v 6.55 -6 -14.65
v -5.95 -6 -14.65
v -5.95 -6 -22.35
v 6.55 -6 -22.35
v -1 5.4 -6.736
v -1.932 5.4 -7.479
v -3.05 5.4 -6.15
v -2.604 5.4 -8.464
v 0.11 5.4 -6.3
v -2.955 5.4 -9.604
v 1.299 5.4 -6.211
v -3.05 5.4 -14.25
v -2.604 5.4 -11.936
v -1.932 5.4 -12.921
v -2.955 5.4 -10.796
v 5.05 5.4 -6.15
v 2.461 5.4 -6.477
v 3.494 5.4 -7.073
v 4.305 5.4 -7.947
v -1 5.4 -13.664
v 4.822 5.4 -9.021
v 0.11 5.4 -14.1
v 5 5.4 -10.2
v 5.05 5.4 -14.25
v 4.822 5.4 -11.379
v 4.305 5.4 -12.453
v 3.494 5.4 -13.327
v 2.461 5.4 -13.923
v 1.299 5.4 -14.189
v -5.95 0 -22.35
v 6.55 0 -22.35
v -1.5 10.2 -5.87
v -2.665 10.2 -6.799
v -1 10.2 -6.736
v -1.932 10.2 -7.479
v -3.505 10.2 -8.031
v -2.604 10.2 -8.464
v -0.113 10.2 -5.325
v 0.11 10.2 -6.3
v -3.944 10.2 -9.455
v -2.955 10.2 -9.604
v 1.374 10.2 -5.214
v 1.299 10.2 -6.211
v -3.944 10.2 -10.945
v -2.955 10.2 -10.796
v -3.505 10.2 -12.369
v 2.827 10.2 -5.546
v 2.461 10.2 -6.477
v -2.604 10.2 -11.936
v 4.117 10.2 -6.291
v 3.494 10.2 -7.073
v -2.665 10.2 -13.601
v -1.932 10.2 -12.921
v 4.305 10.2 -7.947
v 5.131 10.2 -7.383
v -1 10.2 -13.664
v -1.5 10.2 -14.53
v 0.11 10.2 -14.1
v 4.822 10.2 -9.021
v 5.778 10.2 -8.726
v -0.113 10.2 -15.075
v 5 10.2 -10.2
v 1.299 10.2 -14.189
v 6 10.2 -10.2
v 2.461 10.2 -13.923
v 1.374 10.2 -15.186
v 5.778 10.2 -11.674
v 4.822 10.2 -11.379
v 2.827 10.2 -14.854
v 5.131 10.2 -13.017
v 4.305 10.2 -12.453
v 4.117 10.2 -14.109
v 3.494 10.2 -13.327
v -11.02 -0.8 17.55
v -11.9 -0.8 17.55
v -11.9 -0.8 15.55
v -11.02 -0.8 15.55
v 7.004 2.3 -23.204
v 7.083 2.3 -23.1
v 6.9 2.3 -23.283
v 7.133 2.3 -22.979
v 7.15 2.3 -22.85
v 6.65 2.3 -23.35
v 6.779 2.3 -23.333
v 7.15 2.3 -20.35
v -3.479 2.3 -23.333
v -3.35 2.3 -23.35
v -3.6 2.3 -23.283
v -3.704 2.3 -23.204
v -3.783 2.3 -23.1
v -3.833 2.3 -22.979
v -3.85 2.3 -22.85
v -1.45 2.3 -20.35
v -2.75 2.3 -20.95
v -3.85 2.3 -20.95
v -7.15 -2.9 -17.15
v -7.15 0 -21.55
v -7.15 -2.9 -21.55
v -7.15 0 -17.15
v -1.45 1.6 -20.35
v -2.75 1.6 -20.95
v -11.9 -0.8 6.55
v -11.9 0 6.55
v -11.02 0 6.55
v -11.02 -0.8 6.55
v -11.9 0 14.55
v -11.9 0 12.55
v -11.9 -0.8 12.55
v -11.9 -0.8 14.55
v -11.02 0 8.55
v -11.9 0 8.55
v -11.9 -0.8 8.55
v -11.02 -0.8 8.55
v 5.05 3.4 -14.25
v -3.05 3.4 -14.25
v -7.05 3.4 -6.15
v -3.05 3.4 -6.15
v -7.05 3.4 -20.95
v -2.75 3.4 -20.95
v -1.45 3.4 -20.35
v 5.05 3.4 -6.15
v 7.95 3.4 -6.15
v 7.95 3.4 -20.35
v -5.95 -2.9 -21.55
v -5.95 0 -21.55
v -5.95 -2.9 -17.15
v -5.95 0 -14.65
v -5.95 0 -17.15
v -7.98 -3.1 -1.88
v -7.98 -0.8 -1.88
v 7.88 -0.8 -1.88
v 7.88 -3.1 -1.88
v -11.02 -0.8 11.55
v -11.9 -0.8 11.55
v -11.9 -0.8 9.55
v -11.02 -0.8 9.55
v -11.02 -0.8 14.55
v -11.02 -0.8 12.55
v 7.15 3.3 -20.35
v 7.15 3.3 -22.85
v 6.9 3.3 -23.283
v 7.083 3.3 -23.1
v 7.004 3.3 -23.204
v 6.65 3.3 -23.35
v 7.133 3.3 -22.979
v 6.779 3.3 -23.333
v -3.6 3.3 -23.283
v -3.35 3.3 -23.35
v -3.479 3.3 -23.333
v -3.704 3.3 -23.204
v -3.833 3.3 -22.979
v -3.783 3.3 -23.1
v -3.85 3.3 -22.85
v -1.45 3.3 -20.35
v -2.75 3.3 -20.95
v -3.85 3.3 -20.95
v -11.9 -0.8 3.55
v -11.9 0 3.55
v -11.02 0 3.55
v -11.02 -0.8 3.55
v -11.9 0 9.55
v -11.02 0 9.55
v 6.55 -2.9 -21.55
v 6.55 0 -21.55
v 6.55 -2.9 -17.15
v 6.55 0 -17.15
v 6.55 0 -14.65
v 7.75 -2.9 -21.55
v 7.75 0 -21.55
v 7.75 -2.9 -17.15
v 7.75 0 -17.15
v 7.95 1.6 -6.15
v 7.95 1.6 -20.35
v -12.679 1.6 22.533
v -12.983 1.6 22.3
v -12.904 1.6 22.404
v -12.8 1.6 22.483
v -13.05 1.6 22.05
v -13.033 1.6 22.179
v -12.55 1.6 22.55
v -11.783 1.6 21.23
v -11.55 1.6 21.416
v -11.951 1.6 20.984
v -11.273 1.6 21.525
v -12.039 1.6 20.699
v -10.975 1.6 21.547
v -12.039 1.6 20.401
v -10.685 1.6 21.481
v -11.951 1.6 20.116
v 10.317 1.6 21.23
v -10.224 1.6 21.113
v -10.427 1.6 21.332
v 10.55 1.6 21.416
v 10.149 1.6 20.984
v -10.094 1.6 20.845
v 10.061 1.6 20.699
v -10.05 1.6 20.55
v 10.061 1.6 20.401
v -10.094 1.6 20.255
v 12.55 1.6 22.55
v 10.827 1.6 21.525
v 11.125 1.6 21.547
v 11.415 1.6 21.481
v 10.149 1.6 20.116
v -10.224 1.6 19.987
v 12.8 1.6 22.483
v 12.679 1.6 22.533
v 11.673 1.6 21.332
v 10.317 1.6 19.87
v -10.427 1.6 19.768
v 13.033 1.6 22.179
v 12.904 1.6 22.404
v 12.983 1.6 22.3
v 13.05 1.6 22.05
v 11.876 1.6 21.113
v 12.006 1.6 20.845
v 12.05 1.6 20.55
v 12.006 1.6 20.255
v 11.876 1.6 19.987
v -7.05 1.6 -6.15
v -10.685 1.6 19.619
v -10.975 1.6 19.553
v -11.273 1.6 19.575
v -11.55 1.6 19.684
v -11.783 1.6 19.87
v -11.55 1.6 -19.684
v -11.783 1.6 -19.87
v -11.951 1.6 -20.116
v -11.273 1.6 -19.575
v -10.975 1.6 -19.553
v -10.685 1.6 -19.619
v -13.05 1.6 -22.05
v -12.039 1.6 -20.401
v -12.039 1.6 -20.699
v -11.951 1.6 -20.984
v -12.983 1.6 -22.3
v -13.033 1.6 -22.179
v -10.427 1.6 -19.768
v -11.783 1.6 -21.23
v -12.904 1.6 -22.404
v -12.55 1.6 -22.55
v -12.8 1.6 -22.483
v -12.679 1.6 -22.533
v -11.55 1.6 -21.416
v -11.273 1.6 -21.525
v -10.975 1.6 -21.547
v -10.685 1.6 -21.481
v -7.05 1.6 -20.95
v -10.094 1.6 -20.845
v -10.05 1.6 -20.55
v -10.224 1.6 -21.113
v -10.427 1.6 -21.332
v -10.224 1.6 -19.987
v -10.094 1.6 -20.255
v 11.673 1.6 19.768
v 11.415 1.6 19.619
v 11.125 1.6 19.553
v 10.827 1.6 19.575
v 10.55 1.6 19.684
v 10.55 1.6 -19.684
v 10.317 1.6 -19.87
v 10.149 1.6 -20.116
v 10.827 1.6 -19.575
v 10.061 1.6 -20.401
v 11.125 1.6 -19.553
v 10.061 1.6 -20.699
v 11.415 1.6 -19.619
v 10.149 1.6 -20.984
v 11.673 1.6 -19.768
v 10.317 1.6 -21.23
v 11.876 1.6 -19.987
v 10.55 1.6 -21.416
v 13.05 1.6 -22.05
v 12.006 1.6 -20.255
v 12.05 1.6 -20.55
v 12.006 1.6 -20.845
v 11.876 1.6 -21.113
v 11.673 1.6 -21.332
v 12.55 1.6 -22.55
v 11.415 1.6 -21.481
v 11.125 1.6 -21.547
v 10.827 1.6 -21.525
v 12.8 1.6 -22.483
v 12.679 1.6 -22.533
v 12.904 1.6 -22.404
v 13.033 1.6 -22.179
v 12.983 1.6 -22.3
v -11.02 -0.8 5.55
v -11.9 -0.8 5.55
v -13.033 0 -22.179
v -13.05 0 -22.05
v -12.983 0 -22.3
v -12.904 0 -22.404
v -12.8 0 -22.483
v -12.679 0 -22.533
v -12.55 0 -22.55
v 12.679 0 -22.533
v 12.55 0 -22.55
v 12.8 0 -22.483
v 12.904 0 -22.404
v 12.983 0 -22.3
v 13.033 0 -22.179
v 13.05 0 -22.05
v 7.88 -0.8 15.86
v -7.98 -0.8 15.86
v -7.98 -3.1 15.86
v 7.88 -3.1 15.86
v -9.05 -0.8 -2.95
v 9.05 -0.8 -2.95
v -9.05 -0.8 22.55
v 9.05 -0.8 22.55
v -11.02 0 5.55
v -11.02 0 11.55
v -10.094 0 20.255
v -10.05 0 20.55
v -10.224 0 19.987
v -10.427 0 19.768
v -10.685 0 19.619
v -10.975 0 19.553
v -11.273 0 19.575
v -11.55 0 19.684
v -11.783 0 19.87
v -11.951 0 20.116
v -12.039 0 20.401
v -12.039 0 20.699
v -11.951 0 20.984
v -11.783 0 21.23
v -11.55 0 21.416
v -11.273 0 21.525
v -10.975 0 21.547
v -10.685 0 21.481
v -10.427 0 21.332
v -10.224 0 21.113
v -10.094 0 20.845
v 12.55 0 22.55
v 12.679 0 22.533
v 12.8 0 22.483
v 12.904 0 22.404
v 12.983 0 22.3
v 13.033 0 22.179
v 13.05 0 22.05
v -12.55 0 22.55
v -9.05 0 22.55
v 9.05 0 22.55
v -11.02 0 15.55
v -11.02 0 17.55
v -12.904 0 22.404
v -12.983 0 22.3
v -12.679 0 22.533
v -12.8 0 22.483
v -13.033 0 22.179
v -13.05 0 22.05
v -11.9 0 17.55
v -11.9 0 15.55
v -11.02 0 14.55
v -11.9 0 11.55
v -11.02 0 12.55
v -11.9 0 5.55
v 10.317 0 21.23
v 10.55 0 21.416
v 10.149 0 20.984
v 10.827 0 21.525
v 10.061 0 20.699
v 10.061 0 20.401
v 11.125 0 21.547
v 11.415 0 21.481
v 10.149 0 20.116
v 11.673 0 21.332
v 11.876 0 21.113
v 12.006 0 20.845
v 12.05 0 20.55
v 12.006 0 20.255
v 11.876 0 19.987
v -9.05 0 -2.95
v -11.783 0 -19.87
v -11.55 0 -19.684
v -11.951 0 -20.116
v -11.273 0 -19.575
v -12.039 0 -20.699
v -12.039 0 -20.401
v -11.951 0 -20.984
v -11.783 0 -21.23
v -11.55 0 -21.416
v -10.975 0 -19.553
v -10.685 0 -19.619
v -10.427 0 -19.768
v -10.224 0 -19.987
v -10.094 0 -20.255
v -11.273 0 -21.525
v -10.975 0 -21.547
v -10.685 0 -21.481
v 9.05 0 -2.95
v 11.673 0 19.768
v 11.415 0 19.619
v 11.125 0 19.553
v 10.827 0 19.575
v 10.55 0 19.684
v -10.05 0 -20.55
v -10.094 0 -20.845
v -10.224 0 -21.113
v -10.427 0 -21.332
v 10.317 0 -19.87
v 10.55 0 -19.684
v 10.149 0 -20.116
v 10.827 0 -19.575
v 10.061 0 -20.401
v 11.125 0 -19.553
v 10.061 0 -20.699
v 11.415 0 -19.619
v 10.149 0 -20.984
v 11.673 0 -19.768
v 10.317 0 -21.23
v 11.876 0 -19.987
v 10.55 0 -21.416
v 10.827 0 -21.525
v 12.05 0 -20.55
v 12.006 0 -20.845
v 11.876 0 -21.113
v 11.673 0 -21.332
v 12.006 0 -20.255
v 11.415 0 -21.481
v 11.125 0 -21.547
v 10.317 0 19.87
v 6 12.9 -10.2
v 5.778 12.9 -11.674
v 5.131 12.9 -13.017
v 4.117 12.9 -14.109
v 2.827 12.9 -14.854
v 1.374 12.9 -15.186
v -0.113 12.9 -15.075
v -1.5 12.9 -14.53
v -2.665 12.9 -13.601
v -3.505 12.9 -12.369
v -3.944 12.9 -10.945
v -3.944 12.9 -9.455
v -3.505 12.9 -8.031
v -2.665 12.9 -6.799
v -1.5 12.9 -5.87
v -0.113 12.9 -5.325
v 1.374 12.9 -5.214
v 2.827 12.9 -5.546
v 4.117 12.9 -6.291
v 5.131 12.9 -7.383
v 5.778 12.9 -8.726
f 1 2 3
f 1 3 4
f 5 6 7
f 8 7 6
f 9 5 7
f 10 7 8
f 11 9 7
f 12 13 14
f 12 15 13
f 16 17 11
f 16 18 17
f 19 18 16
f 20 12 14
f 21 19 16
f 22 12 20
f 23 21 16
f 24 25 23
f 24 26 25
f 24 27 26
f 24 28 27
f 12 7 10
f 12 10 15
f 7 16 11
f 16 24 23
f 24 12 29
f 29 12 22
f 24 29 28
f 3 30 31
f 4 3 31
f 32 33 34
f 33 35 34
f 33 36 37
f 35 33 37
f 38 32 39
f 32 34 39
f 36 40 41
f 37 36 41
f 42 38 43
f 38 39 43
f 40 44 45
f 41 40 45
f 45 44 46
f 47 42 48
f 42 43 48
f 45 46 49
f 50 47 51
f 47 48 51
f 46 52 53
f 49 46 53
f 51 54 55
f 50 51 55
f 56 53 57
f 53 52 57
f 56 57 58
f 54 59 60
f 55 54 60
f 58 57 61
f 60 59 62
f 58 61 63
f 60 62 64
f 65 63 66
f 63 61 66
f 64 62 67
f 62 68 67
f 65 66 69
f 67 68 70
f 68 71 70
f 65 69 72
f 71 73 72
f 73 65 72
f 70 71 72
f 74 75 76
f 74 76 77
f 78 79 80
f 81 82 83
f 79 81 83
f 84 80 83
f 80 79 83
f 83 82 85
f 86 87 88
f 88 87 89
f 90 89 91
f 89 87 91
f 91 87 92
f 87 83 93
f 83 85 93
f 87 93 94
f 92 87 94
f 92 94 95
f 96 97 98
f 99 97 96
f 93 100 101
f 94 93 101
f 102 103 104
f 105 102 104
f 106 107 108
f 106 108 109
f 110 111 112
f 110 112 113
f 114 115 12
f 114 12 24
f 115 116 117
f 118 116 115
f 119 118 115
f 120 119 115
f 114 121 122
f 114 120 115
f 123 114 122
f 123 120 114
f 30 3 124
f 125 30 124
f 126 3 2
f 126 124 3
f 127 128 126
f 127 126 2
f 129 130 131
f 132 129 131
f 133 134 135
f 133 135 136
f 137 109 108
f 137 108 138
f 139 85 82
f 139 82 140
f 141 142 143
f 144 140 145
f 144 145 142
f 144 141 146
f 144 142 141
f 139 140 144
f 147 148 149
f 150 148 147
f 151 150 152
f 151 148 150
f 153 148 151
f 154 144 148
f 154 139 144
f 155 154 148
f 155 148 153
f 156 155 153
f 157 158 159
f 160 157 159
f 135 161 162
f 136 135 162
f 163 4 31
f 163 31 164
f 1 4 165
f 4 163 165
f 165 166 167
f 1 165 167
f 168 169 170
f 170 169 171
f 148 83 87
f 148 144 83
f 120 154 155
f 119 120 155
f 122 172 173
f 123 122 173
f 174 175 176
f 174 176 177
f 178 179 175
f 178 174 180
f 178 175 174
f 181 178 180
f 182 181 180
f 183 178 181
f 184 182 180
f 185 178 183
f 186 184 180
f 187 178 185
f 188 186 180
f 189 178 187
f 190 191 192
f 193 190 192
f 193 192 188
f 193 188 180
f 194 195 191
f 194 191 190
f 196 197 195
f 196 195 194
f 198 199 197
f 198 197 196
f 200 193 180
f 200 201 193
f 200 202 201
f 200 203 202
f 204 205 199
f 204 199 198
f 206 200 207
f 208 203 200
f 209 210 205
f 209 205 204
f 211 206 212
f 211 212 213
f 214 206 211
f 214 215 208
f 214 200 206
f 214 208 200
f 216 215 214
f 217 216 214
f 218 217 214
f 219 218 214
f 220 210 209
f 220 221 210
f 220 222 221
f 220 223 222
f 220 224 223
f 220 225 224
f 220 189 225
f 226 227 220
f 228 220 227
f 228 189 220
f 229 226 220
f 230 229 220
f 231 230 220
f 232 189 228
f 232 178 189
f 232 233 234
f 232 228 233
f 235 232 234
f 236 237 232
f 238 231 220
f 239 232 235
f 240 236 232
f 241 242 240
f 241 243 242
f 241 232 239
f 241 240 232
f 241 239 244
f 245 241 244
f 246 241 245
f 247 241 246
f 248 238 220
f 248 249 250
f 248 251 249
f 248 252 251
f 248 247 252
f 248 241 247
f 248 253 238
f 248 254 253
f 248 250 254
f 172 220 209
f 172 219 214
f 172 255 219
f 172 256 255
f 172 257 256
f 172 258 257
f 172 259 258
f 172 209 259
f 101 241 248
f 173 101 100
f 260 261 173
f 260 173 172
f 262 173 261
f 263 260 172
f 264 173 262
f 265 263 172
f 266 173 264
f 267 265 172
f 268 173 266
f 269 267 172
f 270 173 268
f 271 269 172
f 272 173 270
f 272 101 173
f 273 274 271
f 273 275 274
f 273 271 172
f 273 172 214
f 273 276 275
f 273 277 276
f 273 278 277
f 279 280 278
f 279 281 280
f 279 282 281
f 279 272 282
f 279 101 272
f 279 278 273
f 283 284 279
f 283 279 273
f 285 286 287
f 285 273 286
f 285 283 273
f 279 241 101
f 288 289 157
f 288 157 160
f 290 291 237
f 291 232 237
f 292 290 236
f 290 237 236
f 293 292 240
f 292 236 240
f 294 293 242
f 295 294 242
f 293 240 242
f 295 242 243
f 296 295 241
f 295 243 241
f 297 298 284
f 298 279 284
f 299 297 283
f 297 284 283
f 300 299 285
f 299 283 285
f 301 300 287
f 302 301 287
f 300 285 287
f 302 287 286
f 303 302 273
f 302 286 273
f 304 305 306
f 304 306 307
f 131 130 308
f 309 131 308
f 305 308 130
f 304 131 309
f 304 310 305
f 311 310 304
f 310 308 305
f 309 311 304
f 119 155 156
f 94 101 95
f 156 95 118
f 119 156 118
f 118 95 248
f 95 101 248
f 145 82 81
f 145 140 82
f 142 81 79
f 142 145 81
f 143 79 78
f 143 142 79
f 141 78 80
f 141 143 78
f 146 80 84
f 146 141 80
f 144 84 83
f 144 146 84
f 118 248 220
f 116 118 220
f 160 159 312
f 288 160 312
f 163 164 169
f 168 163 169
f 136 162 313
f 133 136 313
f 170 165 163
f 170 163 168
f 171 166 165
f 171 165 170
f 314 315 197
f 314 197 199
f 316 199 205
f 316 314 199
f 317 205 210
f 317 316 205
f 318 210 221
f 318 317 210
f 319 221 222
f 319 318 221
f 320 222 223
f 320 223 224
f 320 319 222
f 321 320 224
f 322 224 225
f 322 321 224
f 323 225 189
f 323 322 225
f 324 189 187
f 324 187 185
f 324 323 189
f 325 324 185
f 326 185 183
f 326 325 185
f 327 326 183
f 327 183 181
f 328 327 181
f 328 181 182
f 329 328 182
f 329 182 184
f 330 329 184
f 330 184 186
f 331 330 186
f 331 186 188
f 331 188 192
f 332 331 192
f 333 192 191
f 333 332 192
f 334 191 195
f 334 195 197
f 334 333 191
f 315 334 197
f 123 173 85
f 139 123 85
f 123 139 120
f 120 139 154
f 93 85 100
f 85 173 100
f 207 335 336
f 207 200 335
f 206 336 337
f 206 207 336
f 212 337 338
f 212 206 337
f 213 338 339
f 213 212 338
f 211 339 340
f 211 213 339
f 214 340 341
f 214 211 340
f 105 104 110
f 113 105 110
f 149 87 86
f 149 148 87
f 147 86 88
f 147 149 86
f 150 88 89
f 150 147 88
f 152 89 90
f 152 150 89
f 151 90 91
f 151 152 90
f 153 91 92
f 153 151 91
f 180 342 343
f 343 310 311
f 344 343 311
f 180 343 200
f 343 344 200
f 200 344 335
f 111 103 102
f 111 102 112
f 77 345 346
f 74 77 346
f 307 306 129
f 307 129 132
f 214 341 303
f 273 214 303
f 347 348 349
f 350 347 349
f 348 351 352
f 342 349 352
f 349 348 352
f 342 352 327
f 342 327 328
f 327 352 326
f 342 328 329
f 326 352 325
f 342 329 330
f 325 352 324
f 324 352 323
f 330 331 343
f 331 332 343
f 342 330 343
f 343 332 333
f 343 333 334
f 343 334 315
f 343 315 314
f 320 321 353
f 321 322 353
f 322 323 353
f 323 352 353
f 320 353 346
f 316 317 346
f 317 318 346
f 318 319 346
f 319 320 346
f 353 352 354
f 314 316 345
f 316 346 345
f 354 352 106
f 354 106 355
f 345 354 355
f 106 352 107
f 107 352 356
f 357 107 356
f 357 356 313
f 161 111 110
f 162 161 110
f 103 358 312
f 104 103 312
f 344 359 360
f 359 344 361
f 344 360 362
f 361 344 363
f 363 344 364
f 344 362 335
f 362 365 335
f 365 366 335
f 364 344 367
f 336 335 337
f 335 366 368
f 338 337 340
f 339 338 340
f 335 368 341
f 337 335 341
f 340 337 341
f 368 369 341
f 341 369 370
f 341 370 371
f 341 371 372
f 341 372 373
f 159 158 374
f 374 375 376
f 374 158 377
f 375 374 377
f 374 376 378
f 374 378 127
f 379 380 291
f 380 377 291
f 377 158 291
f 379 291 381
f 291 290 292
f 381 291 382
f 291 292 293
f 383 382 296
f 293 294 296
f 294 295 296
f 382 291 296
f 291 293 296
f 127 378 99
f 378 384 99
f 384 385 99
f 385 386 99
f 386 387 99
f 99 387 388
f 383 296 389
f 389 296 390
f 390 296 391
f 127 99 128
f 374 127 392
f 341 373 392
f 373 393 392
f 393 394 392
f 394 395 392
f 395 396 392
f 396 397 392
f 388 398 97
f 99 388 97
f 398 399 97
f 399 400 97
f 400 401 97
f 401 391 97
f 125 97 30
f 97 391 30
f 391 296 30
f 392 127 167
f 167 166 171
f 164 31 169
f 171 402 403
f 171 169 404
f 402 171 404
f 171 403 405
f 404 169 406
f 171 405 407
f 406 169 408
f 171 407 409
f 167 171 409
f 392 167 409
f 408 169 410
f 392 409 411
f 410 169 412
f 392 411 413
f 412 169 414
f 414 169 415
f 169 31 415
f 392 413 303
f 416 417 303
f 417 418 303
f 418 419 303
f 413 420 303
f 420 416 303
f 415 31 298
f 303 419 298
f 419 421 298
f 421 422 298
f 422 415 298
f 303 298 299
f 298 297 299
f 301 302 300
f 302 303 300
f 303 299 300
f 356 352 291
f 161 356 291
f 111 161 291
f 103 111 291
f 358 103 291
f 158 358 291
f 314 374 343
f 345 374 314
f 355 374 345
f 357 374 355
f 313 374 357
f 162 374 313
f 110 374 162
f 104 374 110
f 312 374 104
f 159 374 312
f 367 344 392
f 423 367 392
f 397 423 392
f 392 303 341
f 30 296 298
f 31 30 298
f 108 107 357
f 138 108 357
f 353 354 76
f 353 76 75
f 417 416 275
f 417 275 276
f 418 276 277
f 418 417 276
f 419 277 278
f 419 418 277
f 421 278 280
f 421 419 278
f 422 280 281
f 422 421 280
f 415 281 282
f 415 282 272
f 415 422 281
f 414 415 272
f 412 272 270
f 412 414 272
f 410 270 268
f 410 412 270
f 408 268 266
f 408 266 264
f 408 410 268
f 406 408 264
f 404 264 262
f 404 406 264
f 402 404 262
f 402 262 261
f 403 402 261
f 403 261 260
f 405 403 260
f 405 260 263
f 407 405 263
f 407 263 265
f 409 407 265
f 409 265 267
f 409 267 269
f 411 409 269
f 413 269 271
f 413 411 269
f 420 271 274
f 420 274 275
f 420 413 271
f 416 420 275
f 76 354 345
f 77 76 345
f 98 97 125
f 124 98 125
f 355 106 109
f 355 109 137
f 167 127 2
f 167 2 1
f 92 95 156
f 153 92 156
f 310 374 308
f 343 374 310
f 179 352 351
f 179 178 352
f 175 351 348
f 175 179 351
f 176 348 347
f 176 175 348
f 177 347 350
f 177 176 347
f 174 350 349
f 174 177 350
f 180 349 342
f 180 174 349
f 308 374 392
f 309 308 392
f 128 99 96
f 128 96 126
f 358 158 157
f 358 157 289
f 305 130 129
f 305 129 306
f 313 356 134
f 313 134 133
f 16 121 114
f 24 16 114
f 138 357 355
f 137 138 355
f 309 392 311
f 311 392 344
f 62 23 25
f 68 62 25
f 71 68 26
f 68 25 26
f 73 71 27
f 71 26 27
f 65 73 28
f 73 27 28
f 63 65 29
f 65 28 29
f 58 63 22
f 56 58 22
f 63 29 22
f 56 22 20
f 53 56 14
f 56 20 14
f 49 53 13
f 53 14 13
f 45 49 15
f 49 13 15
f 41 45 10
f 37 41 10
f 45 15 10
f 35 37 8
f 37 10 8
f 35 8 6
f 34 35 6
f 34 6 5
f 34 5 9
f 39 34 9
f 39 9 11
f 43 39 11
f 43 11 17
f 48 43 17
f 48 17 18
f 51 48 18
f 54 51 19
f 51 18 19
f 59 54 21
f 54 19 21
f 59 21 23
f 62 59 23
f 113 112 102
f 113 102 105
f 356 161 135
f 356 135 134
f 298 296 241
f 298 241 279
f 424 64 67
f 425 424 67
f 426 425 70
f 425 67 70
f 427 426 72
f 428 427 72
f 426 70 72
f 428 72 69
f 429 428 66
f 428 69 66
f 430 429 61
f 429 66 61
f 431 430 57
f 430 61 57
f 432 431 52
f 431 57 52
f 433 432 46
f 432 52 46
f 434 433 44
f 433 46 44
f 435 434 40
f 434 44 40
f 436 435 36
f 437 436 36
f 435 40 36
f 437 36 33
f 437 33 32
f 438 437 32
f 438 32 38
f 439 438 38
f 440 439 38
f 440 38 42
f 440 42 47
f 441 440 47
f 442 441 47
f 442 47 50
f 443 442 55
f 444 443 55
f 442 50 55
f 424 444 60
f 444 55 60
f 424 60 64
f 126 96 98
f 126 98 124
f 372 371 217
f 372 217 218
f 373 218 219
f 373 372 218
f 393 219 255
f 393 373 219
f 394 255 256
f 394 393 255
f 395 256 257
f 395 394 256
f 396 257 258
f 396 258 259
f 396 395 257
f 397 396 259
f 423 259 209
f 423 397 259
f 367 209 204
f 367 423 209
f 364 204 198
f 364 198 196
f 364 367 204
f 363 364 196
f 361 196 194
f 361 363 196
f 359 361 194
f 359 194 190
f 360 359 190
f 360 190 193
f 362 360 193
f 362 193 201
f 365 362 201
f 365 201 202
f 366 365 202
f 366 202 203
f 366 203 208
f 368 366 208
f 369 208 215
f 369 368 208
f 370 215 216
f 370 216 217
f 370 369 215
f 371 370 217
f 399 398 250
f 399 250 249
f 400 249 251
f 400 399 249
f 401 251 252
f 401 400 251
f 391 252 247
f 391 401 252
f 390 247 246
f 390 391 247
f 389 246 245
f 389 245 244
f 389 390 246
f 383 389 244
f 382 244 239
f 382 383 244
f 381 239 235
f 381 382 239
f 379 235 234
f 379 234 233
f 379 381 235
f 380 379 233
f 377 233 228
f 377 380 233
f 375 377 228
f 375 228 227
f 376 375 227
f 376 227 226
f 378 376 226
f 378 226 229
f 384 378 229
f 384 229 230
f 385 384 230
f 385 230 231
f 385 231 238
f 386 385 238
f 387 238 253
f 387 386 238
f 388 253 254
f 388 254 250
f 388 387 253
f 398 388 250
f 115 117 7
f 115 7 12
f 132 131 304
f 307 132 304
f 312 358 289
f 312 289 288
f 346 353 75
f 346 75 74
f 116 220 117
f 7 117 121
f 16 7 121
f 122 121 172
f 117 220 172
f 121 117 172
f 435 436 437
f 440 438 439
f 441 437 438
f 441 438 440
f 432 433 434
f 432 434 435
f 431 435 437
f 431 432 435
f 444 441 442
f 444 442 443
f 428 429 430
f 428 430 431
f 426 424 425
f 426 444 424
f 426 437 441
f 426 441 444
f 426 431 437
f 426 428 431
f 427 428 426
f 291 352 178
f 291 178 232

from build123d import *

# Parameters (mm, degrees)
SKETCH_1_W       = 26.1
SKETCH_1_H       = 45.1
SKETCH_1_R       = 1
EXTRUDE_1_DEPTH  = 1.6
EXTRUDE_2_DEPTH  = 1.8
SKETCH_3_W       = 11
SKETCH_3_H       = 1
EXTRUDE_3_DEPTH  = 3
FILLET_1_R       = 0.5
SKETCH_4_W       = 8.1
SKETCH_4_H       = 8.1
EXTRUDE_4_DEPTH  = 2
SKETCH_5_R       = 4
EXTRUDE_5_DEPTH  = 4.8
SKETCH_6_R       = 5
EXTRUDE_6_DEPTH  = 2.7
SKETCH_7_W       = 12.5
SKETCH_7_H       = 7.7
EXTRUDE_7_DEPTH  = 6
SKETCH_9_W       = 1.2
SKETCH_9_H       = 4.4
EXTRUDE_8_DEPTH  = 2.9
SKETCH_10_W      = 18.1
SKETCH_10_H      = 25.5
EXTRUDE_9_DEPTH  = 0.8
SKETCH_11_W      = 15.86
SKETCH_11_H      = 17.74
EXTRUDE_10_DEPTH = 2.3
SKETCH_12_W      = 0.88
SKETCH_12_H      = 2
EXTRUDE_11_DEPTH = 0.8


with BuildPart() as part:
    # 草图1 → 凸台-拉伸1 (new body)
    with BuildSketch(Plane(origin=(0, 0, 0), x_dir=(1, 0, 0), z_dir=(0, 1, 0))):
        Rectangle(SKETCH_1_W, SKETCH_1_H)
        with Locations((-11.05, 20.55)):
            Circle(SKETCH_1_R, mode=Mode.SUBTRACT)
        with Locations((11.05, 20.55)):
            Circle(SKETCH_1_R, mode=Mode.SUBTRACT)
        with Locations((-11.05, -20.55)):
            Circle(SKETCH_1_R, mode=Mode.SUBTRACT)
        with Locations((11.05, -20.55)):
            Circle(SKETCH_1_R, mode=Mode.SUBTRACT)
    extrude(amount=EXTRUDE_1_DEPTH)

    # 草图2 → 凸台-拉伸2 (add)
    with BuildSketch(Plane(origin=(0, 1.6, 0), x_dir=(1, 0, 0), z_dir=(0, 1, 0))):
        Polygon((-7.05, 6.15), (7.95, 6.15), (7.95, 20.35), (-1.45, 20.35), (-2.75, 20.95), (-7.05, 20.95), align=None)
    extrude(amount=EXTRUDE_2_DEPTH)

    # 草图3 → 凸台-拉伸3 (add)
    with BuildSketch(Plane(origin=(0, 0, -20.35), x_dir=(-1, 0, 0), z_dir=(0, 0, -1))):
        with Locations((-1.65, 2.8)):
            Rectangle(SKETCH_3_W, SKETCH_3_H)
    extrude(amount=EXTRUDE_3_DEPTH)

    # 圆角1
    fillet_1_edges = [part.edges().sort_by_distance(p)[0] for p in [
        (-3.85, 2.8, -23.35),
        (7.15, 2.8, -23.35),
        (13.05, 0.8, -22.55),
        (13.05, 0.8, 22.55),
        (-13.05, 0.8, 22.55),
        (-13.05, 0.8, -22.55),
    ]]
    fillet(fillet_1_edges, radius=FILLET_1_R)

    # 草图4 → 凸台-拉伸4 (add)
    with BuildSketch(Plane(origin=(0, 3.4, 0), x_dir=(1, 0, 0), z_dir=(0, 1, 0))):
        with Locations((1, 10.2)):
            Rectangle(SKETCH_4_W, SKETCH_4_H)
    extrude(amount=EXTRUDE_4_DEPTH)

    # 草图5 → 凸台-拉伸5 (add)
    with BuildSketch(Plane(origin=(0, 5.4, 0), x_dir=(1, 0, 0), z_dir=(0, 1, 0))):
        with Locations((1, 10.2)):
            Circle(SKETCH_5_R)
    extrude(amount=EXTRUDE_5_DEPTH)

    # 草图6 → 凸台-拉伸6 (add)
    with BuildSketch(Plane(origin=(0, 10.2, 0), x_dir=(1, 0, 0), z_dir=(0, 1, 0))):
        with Locations((1, 10.2)):
            Circle(SKETCH_6_R)
    extrude(amount=EXTRUDE_6_DEPTH)

    # 草图7 → 凸台-拉伸7 (add)
    with BuildSketch(Plane.XZ):
        with Locations((0.3, -18.5)):
            Rectangle(SKETCH_7_W, SKETCH_7_H)
    extrude(amount=EXTRUDE_7_DEPTH)

    # 草图9 → 凸台-拉伸8 (add)
    with BuildSketch(Plane.XZ):
        with Locations((7.15, -19.35)):
            Rectangle(SKETCH_9_W, SKETCH_9_H)
        with Locations((-6.55, -19.35)):
            Rectangle(SKETCH_9_W, SKETCH_9_H)
    extrude(amount=EXTRUDE_8_DEPTH)

    # 草图10 → 凸台-拉伸9 (add)
    with BuildSketch(Plane.XZ):
        with Locations((0, 9.8)):
            Rectangle(SKETCH_10_W, SKETCH_10_H)
    extrude(amount=EXTRUDE_9_DEPTH)

    # 草图11 → 凸台-拉伸10 (add)
    with BuildSketch(Plane.XZ.offset(0.8)):
        with Locations((-0.05, 6.99)):
            Rectangle(SKETCH_11_W, SKETCH_11_H)
    extrude(amount=EXTRUDE_10_DEPTH)

    # 草图12 → 凸台-拉伸11 (add)
    with BuildSketch(Plane.XZ):
        with Locations((-11.46, 16.55)):
            Rectangle(SKETCH_12_W, SKETCH_12_H)
        with Locations((-11.46, 13.55)):
            Rectangle(SKETCH_12_W, SKETCH_12_H)
        with Locations((-11.46, 10.55)):
            Rectangle(SKETCH_12_W, SKETCH_12_H)
        with Locations((-11.46, 7.55)):
            Rectangle(SKETCH_12_W, SKETCH_12_H)
        with Locations((-11.46, 4.55)):
            Rectangle(SKETCH_12_W, SKETCH_12_H)
    extrude(amount=EXTRUDE_11_DEPTH)


solid = part.part
